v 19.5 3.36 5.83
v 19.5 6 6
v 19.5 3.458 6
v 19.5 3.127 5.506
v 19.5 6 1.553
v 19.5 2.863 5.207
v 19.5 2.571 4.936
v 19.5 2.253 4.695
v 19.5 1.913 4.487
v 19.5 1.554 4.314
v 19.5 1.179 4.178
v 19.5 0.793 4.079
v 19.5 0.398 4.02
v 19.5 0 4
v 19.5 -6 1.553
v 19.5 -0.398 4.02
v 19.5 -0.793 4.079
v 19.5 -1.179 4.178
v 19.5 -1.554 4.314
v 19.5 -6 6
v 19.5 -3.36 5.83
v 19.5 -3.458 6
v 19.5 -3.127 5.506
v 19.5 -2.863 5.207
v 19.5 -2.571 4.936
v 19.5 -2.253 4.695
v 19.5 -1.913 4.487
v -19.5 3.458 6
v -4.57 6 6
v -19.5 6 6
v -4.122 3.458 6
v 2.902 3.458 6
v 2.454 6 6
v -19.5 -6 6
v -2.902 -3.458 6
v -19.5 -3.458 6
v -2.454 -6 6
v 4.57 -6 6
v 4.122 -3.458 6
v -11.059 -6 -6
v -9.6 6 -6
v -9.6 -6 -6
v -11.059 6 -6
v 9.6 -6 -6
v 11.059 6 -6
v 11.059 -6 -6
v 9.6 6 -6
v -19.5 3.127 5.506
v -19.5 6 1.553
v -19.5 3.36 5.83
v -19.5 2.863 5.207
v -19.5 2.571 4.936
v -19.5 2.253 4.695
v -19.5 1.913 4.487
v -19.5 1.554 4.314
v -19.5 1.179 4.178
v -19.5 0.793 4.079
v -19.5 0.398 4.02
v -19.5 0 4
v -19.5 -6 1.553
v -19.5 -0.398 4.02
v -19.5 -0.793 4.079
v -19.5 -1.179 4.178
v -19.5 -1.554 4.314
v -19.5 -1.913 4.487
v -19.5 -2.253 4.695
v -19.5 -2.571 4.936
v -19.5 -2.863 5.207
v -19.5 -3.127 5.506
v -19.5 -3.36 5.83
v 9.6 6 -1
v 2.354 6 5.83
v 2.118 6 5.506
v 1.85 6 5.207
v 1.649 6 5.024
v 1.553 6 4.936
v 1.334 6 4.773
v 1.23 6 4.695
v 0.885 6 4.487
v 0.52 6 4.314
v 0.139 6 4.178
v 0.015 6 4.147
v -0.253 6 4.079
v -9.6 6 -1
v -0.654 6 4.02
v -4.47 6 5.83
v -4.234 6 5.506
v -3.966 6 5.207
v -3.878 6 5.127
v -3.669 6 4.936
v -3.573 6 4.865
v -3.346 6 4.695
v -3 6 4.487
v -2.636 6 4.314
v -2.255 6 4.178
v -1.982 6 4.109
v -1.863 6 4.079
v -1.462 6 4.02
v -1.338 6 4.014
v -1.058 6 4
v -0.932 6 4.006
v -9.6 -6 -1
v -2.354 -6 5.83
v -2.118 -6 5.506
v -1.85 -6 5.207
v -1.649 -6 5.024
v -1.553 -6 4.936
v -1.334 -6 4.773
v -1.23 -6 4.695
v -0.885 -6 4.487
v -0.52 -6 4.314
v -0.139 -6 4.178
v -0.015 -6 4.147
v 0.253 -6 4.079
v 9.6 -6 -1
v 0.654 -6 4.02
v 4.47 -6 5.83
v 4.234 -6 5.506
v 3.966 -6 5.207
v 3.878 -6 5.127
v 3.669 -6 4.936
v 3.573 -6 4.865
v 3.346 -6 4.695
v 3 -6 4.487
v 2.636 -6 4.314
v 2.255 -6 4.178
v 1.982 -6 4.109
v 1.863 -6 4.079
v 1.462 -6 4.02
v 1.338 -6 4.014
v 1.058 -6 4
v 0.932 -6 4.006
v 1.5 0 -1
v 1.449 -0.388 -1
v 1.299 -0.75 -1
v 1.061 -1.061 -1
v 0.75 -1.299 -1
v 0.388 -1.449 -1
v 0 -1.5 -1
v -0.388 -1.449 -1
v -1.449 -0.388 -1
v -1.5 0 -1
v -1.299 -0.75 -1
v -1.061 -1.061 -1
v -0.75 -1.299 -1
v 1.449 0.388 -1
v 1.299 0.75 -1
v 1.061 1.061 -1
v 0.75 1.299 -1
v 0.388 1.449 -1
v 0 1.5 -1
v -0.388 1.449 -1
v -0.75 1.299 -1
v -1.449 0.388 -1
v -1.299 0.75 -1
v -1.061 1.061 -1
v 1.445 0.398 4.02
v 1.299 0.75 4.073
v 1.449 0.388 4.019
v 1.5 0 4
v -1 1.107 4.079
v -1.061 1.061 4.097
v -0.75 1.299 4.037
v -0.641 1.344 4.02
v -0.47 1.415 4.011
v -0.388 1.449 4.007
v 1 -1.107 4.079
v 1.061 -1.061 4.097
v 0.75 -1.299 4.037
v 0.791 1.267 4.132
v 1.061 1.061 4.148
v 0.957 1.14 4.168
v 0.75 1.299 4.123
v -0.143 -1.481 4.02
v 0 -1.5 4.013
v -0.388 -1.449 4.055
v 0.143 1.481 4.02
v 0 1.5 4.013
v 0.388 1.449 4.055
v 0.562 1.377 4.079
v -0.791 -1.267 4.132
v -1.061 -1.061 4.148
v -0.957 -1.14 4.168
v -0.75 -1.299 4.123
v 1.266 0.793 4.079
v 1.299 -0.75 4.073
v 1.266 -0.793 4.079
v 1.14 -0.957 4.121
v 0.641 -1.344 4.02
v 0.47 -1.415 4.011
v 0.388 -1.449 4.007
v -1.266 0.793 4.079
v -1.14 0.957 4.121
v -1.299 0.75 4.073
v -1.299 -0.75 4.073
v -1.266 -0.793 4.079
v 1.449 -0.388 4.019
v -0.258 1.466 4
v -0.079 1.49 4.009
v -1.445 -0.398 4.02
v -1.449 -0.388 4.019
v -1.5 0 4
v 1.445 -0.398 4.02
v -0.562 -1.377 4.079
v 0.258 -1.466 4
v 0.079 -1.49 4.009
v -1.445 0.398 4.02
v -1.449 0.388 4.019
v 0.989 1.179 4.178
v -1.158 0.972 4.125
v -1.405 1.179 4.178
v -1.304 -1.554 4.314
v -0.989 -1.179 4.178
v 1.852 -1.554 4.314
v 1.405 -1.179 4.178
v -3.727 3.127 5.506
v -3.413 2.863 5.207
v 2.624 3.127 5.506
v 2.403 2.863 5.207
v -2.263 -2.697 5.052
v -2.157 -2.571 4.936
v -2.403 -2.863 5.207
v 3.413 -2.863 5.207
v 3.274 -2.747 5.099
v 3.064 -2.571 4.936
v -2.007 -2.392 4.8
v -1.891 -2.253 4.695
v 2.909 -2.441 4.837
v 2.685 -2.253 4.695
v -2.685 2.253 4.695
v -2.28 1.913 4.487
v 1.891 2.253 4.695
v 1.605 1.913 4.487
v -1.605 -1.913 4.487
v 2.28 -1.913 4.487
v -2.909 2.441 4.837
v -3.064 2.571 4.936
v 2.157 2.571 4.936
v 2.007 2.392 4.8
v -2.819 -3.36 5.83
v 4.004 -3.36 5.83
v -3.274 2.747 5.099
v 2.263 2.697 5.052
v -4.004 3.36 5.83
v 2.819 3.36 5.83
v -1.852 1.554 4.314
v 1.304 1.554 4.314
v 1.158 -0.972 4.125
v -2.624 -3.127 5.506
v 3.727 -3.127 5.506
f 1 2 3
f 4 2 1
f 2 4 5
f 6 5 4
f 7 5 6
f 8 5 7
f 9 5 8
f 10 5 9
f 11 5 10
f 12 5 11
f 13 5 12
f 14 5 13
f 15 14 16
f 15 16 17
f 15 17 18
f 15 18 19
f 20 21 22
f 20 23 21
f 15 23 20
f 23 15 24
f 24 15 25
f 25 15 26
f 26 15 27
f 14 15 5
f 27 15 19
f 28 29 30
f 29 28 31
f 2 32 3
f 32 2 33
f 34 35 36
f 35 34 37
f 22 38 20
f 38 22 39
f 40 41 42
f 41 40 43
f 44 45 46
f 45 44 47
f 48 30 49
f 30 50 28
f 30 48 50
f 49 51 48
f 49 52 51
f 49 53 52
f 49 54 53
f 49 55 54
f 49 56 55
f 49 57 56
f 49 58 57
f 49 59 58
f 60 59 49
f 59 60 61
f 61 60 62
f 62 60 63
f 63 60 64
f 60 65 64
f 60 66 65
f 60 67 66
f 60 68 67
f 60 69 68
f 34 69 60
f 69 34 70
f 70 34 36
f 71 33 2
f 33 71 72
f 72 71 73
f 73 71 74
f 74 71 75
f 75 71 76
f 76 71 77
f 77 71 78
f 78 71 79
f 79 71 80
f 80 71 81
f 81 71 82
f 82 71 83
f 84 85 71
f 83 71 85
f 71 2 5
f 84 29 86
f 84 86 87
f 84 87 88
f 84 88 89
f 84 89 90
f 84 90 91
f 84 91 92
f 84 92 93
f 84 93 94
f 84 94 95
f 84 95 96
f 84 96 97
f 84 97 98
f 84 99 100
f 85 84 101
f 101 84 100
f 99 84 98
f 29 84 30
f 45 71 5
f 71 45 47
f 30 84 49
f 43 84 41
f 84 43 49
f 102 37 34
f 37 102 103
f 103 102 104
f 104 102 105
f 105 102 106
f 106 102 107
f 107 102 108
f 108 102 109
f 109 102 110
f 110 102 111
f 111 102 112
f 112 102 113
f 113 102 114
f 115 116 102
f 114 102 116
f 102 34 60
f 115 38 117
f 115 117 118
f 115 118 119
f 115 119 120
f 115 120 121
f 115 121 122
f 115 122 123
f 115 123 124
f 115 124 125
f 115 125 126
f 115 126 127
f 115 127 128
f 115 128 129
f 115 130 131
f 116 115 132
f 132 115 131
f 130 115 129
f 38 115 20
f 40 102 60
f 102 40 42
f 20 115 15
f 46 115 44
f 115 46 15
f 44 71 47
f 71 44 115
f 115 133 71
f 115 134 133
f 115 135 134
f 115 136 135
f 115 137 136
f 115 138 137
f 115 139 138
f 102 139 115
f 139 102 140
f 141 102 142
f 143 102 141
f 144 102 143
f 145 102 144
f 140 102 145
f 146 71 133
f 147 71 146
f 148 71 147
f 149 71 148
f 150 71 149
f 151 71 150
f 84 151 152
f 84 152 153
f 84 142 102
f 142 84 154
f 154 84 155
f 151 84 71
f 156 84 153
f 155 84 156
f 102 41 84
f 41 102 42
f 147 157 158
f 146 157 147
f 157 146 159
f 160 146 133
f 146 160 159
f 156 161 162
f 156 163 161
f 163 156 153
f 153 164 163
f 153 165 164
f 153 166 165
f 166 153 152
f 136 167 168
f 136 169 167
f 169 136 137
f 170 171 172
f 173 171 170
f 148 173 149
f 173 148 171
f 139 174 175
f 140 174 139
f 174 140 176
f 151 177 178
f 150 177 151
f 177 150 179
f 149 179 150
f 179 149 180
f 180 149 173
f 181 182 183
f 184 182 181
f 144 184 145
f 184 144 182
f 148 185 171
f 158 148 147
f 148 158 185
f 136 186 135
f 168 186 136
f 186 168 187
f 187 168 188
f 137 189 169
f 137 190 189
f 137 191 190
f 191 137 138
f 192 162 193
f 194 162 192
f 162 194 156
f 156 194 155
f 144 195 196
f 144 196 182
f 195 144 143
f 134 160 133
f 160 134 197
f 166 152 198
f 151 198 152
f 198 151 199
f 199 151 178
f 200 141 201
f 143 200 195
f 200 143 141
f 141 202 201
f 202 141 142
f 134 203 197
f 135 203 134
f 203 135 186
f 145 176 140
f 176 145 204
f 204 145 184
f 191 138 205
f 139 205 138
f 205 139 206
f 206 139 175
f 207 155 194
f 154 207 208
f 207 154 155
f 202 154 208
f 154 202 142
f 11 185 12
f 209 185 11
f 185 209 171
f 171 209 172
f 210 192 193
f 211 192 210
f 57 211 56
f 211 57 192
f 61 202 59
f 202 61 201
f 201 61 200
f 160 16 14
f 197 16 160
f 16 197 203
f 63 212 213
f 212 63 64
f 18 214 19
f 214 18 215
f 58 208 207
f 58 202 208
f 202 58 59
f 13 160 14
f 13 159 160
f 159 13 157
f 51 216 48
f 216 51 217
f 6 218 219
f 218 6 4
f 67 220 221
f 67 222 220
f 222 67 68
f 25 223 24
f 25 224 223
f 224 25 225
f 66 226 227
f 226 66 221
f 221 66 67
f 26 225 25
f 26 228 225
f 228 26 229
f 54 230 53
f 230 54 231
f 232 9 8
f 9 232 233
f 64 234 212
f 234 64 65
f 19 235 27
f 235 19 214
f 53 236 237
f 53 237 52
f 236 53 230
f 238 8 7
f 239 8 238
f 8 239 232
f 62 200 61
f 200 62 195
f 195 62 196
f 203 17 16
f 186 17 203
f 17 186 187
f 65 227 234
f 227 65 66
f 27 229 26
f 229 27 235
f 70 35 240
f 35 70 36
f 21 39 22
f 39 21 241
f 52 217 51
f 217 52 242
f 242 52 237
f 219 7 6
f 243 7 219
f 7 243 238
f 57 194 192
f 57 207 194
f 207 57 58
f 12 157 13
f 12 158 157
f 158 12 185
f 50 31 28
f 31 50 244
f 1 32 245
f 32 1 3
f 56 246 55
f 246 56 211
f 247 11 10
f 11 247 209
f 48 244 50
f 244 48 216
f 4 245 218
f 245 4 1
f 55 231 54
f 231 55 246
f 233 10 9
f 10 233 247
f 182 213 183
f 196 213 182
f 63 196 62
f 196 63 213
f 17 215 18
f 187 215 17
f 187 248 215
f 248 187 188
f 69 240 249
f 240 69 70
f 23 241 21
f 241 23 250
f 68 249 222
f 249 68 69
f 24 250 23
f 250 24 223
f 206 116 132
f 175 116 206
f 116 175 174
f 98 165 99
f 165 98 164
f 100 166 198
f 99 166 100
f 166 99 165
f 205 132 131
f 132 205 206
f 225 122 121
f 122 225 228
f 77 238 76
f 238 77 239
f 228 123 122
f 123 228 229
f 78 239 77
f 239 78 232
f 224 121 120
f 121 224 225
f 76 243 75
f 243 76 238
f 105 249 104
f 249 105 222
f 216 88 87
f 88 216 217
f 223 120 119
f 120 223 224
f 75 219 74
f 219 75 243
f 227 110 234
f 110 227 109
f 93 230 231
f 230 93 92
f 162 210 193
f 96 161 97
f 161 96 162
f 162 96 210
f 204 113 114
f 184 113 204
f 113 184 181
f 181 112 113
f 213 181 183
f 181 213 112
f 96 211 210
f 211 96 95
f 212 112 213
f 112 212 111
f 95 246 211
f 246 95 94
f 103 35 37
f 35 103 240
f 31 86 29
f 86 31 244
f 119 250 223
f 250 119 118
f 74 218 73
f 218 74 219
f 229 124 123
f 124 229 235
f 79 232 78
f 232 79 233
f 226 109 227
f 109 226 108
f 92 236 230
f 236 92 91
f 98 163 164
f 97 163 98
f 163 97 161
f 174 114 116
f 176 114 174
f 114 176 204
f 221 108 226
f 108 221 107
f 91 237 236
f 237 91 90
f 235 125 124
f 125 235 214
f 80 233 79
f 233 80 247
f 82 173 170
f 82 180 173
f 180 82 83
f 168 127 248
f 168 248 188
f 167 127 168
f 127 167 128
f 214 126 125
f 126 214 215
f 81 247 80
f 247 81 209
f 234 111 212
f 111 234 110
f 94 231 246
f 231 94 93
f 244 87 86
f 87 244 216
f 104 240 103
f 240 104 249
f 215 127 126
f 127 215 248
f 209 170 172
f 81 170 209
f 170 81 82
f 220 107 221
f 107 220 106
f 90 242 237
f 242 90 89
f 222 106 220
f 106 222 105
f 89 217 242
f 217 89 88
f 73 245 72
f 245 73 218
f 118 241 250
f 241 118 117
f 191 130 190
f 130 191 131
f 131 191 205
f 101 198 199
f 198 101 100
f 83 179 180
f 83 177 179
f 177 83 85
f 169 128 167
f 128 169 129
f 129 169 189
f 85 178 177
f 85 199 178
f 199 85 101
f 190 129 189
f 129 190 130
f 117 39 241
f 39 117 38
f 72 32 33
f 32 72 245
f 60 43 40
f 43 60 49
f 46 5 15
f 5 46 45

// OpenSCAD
/*
BA7LVG
2025.07.08
*/

$fa = 1;
$fs = 0.4;

mounting_width = 12;
boom_width = 19;
element_dia = 8;
element_gap = 5;
mounting_screw = 3;
parking_angle = 10;

module base(mw = 12, bw = 19, ms = 3){
    difference(){
        difference(){
                cube([boom_width + 20, mounting_width, 12],center=true);
                translate([0,0,-6])
                    cube([boom_width + 0.2, mounting_width + 0.5, 10],center=true);
        }
        cylinder(h = 12, r = ms / 2, center = true);
    }
}

module chamfer(){
    p0 = [boom_width / 2 + 10.5, 2];
    p1 = [boom_width / 2 + 10.5, -6.5];
    p2 = [boom_width / 2 + 1, -6.5];
    
    translate([0, mounting_width / 2 + 0.5, 0])
        rotate([90, 0, 0])
            linear_extrude(height = mounting_width + 1)
                polygon([p0, p1, p2]);
    
}

module element(dia = 8, gap = 5){
    translate([0, 0, element_gap - 1 + element_dia / 2])
        rotate([0, 90, 0])
            cylinder(h = boom_width + 20.5, r = element_dia / 2, center = true);
}

module parking_slot(dia = 8, gap = 5, ang = 10){
    translate([0, 0, element_gap - 1 + element_dia / 2])
        rotate([0, 90, 90 + ang])
            cylinder(h = mounting_width + 20, r = dia / 2, center = true);
}


difference(){
    base(mw = mounting_width, bw = boom_width, ms = mounting_screw);
    element(dia = element_dia, gap = element_gap);
    parking_slot(dia = element_dia, gap = element_gap, ang = parking_angle);
    mirror([1, 0, 0])
        chamfer();
    chamfer();
}
